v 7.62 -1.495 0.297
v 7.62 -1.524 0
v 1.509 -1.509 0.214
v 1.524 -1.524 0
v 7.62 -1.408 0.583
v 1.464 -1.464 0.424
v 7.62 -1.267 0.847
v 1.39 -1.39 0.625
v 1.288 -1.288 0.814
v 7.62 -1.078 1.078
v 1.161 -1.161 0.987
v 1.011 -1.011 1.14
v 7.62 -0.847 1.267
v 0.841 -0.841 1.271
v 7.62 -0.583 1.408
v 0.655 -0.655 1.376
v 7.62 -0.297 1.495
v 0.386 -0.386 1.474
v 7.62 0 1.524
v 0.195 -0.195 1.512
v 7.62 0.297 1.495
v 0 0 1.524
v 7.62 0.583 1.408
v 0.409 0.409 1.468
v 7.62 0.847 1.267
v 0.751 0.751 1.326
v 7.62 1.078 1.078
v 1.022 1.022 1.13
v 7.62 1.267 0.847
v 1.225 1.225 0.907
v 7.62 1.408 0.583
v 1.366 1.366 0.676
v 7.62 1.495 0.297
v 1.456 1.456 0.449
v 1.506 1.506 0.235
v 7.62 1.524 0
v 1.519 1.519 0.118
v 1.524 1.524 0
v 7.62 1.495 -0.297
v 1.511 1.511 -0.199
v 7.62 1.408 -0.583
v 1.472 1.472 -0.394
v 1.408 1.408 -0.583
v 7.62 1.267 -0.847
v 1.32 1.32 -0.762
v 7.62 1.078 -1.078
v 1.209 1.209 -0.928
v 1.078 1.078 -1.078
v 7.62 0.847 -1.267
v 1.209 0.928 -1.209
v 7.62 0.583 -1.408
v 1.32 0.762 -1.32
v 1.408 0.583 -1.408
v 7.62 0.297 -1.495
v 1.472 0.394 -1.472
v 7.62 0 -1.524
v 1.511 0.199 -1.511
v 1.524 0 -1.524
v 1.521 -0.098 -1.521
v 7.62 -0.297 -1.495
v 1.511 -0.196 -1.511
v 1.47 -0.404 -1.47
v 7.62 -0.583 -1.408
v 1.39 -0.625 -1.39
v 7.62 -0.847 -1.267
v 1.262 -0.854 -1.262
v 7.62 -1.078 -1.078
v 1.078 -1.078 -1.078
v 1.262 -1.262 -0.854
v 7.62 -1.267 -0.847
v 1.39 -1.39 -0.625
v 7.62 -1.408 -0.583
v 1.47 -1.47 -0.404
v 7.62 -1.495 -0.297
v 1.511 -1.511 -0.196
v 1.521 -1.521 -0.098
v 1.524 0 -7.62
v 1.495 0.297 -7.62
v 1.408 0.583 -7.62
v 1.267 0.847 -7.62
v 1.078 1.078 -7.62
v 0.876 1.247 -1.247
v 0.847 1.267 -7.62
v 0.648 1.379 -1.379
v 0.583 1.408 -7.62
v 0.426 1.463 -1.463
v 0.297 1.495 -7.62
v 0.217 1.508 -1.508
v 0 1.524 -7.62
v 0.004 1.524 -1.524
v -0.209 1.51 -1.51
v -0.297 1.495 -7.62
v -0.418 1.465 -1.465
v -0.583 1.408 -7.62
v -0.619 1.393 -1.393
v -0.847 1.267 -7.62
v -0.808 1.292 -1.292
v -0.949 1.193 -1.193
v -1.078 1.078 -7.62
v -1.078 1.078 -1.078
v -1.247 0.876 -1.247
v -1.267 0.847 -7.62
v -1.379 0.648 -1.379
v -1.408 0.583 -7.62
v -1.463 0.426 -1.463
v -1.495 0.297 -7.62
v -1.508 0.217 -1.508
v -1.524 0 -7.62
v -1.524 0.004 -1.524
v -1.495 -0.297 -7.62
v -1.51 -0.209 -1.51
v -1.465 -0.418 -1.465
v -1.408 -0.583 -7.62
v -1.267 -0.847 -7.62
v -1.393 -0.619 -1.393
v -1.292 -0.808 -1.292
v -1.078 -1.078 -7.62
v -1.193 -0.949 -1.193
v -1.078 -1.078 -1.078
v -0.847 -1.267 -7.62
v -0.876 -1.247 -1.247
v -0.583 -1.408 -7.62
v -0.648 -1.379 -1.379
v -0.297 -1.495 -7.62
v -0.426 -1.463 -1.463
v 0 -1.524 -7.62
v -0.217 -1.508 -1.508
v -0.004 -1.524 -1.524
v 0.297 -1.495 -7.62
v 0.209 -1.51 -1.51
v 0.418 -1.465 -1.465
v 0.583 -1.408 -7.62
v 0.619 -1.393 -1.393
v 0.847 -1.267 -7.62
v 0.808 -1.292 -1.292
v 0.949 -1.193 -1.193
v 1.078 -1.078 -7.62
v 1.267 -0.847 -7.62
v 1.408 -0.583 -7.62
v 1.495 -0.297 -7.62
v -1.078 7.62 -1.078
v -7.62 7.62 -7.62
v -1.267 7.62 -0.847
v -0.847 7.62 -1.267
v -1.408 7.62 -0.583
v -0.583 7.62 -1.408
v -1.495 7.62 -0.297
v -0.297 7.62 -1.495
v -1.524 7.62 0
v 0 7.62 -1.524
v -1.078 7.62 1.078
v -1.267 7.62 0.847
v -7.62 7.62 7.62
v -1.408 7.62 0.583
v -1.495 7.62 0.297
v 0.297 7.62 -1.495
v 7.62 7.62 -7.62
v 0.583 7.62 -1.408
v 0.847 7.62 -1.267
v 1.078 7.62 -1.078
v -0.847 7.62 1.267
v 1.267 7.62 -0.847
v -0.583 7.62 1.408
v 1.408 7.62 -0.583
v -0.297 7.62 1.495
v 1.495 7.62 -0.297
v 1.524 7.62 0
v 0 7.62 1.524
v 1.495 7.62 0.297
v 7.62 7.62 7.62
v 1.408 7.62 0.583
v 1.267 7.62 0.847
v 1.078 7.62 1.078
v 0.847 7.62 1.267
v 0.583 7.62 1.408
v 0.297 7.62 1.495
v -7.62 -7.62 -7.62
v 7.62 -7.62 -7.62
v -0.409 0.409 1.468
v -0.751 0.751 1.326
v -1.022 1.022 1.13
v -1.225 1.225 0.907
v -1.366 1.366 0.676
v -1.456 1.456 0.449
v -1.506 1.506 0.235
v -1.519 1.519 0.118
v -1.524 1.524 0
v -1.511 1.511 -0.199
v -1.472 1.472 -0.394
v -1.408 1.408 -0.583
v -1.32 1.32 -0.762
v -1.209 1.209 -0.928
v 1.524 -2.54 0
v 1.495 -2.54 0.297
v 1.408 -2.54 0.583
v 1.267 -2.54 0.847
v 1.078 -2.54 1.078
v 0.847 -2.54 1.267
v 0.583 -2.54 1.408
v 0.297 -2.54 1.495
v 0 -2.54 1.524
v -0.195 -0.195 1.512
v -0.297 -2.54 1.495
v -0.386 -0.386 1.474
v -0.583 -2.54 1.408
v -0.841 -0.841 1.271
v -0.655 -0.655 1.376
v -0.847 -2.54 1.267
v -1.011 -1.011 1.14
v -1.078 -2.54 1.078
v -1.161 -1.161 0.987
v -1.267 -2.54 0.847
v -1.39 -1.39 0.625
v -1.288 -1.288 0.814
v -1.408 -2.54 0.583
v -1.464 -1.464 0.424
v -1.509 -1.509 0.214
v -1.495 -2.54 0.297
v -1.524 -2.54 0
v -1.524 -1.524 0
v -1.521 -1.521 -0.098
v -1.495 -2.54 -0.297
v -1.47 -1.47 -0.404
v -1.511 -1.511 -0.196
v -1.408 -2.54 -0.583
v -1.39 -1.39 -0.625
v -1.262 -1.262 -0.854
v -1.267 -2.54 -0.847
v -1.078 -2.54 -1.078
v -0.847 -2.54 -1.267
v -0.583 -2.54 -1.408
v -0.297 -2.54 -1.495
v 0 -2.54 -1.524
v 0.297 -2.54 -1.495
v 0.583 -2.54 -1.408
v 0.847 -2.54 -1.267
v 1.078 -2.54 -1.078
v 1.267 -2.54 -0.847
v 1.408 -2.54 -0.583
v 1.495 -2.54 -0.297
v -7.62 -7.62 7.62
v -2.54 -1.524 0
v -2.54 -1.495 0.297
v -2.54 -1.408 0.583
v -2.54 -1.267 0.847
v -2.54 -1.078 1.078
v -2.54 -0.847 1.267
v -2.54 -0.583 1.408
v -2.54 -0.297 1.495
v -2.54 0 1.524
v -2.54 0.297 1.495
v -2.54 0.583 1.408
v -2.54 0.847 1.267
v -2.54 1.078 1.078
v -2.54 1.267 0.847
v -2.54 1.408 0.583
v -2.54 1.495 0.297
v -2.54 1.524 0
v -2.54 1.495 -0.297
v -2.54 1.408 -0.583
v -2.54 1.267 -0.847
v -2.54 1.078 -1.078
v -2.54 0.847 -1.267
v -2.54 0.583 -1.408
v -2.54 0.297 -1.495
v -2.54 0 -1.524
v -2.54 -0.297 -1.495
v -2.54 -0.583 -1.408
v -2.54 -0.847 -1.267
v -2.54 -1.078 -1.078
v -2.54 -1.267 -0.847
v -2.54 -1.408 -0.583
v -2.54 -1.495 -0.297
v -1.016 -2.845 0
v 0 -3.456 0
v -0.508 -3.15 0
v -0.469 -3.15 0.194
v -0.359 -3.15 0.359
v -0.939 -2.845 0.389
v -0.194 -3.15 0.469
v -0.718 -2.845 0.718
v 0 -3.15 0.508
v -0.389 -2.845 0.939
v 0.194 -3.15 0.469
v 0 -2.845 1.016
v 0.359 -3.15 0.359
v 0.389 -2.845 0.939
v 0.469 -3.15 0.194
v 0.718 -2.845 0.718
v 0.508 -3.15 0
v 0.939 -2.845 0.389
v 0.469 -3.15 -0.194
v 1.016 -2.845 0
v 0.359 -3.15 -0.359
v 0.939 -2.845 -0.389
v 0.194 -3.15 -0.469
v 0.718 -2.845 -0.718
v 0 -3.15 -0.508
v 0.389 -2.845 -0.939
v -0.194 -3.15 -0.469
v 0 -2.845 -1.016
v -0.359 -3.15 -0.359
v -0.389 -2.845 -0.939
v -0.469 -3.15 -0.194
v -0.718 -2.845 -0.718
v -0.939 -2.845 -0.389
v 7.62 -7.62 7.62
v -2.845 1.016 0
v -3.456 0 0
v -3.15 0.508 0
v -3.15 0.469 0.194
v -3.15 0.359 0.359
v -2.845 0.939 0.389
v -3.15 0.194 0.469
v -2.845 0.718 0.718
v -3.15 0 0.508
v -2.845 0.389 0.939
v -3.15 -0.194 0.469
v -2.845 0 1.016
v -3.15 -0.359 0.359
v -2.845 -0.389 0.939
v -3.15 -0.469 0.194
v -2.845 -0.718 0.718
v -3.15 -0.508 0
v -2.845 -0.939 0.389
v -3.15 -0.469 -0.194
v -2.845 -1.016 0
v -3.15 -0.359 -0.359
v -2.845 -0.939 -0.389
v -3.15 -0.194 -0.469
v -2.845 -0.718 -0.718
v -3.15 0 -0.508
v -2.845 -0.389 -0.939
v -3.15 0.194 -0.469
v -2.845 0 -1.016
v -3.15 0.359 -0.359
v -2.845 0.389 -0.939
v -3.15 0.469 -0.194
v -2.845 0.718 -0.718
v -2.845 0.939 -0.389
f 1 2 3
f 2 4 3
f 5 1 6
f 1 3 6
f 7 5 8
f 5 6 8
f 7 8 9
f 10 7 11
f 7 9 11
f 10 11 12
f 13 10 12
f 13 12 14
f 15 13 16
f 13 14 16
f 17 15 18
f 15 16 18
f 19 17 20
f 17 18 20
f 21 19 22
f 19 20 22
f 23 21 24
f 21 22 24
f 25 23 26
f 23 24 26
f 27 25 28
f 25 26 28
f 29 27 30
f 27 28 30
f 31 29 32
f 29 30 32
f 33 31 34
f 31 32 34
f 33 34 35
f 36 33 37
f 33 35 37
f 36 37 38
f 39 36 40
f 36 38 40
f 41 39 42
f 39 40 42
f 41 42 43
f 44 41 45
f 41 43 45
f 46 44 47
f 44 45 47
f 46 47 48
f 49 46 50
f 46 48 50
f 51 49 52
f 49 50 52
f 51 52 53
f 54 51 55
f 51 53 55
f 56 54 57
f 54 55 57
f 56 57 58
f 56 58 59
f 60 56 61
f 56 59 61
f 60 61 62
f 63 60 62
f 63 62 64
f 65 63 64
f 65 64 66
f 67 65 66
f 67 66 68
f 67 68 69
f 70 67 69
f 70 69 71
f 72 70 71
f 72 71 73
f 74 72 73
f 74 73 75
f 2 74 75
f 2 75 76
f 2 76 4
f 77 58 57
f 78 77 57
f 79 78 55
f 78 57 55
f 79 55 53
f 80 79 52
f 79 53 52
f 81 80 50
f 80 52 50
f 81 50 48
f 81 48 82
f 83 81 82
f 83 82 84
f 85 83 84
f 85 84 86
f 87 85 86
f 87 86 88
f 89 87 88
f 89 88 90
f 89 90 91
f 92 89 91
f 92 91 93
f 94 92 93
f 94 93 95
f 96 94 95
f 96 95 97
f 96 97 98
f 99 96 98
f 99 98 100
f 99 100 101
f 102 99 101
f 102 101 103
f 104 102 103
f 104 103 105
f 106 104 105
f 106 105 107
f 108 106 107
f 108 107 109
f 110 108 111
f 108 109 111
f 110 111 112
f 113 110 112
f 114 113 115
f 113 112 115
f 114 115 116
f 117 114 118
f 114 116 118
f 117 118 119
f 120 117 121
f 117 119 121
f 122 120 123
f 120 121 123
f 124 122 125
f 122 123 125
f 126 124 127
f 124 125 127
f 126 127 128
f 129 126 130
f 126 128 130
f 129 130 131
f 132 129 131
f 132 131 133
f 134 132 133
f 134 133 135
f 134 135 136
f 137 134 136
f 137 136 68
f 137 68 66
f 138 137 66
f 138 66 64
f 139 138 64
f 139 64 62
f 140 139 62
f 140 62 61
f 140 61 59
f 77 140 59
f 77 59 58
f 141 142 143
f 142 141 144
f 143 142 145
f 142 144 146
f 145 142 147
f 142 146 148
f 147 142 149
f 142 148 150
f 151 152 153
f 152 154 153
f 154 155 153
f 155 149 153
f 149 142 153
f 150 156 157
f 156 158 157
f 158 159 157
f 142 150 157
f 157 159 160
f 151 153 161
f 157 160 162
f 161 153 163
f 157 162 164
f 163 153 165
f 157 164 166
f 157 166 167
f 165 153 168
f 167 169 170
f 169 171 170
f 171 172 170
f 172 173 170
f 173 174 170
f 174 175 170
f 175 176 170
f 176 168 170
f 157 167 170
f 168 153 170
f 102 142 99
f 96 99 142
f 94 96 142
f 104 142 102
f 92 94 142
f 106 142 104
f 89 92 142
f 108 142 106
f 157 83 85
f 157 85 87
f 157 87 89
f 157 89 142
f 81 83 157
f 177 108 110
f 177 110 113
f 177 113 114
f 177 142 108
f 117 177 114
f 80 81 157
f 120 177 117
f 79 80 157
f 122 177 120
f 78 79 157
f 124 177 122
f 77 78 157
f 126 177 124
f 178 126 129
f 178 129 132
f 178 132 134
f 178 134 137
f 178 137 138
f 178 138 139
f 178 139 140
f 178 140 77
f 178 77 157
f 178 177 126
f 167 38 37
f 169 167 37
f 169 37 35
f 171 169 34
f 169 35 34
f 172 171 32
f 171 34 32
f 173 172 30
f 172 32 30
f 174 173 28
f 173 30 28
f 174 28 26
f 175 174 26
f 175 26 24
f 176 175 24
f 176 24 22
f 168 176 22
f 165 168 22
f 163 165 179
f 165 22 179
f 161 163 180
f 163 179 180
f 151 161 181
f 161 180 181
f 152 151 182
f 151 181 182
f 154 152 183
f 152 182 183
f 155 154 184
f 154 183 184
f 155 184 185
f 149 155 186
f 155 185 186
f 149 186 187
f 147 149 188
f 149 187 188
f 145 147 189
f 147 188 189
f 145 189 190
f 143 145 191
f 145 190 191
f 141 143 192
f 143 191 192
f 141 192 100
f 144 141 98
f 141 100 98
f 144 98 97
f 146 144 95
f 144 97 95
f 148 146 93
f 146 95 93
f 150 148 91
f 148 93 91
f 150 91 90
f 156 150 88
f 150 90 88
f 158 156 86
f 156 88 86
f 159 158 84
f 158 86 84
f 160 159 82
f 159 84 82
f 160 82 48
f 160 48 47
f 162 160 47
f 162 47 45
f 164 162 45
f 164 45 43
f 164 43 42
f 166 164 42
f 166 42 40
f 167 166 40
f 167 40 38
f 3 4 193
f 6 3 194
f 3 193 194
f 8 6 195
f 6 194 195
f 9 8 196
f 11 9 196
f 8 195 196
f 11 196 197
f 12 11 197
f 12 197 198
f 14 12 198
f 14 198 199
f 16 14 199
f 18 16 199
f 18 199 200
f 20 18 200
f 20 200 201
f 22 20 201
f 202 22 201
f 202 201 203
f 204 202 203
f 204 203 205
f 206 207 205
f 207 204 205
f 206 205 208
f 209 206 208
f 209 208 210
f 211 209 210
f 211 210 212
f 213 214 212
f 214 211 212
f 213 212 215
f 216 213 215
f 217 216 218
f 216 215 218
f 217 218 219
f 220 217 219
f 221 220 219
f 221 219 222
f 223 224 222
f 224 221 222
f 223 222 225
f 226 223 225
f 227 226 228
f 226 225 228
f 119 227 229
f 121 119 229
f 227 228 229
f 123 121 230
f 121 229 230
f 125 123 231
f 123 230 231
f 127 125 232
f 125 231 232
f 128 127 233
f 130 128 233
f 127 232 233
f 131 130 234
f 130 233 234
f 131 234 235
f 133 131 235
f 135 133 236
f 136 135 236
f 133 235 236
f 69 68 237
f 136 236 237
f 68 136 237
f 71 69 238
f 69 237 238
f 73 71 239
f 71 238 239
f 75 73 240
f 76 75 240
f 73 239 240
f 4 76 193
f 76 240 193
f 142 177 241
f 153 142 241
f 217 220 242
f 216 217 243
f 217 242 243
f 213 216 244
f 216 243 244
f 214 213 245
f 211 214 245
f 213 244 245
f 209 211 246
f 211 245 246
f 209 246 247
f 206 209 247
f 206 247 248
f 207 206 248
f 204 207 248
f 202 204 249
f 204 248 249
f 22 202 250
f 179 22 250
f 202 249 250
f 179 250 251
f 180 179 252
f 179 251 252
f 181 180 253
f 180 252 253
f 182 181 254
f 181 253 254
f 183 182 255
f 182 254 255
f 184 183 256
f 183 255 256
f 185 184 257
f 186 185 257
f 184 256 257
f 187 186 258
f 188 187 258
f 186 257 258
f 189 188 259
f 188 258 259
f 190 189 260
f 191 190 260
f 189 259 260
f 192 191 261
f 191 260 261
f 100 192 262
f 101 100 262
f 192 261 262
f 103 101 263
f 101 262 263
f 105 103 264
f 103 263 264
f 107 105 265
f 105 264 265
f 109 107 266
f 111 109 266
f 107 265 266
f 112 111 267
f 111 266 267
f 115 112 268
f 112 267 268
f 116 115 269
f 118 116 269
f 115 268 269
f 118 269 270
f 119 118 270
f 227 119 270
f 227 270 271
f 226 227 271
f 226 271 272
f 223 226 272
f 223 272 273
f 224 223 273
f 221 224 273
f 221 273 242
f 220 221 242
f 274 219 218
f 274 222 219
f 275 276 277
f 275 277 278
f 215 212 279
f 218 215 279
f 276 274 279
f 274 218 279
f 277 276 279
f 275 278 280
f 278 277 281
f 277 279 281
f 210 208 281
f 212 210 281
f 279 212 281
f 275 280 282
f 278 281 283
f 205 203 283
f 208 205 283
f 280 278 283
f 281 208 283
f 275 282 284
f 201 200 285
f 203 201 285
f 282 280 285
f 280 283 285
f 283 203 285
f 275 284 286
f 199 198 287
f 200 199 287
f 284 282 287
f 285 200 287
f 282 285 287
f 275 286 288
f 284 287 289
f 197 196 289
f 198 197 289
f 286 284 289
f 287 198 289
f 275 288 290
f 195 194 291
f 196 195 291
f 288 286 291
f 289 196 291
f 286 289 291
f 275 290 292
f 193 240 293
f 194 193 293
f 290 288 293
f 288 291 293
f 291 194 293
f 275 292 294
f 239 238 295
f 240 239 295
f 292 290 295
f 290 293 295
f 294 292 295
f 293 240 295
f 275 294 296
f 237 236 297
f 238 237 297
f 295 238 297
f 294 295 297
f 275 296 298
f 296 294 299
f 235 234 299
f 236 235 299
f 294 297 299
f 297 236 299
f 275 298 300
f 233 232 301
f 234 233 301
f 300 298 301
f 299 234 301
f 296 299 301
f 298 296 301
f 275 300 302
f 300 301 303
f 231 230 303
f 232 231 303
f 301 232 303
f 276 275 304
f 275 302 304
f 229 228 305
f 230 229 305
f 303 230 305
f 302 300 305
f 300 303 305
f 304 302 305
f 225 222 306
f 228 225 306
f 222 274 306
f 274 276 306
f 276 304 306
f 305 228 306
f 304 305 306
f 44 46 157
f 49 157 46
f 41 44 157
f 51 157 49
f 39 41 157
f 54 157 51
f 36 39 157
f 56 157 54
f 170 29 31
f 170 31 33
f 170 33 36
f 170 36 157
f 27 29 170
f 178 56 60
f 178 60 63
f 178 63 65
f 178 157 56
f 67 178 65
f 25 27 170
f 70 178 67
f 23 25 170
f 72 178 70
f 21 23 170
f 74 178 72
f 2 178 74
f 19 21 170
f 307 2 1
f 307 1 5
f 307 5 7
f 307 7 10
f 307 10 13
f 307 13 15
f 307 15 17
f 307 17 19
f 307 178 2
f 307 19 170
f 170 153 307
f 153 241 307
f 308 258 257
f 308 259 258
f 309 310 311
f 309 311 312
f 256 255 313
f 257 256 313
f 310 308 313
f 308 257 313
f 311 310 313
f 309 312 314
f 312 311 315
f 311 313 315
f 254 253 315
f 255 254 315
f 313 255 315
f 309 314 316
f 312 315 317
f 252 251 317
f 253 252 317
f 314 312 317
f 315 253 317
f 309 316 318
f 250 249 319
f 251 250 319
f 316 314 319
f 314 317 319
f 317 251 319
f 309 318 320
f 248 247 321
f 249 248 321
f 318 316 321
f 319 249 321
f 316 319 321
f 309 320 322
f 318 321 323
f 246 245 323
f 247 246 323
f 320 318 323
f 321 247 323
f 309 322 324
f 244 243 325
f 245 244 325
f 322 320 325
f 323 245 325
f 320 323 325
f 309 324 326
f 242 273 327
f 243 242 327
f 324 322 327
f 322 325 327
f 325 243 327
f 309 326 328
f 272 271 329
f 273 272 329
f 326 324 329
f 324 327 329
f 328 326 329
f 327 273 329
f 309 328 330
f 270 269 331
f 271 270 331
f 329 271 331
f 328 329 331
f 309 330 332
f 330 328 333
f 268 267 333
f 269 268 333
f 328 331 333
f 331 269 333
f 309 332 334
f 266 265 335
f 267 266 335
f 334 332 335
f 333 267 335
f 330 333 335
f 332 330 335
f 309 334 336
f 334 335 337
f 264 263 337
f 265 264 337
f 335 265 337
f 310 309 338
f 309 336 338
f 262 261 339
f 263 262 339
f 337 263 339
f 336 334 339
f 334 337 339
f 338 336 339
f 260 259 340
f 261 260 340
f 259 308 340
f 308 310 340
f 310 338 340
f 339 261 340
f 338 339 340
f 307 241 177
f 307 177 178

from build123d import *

# Parameters (mm, degrees)
F0_W     = 15.24
F0_H     = 15.24
F1_DEPTH = 7.62
F3_D     = 3.048
F3_DEPTH = 10.16
F3_TIP   = 0.9157115834
F5_D     = 3.048
F5_DEPTH = 10.16
F5_TIP   = 0.9157115834
F7_D     = 3.048
F7_DEPTH = 10.16
F7_TIP   = 0.9157115834


with BuildPart() as f1:
    # F0 (on Front) → F1 (new body, symmetric)
    with BuildSketch(Plane.XZ):
        Rectangle(F0_W, F0_H)
    extrude(amount=F1_DEPTH, both=True)

    # F3 (one way)
    with BuildSketch(Plane.XY):
        with Locations((0, 0)):
            Circle(F3_D / 2)
    extrude(amount=-F3_DEPTH, mode=Mode.SUBTRACT)
    with Locations(Plane.XY):
        with Locations((0, 0)):
            with Locations((0, 0, -(F3_DEPTH + F3_TIP / 2))):  # 118° drill point
                Cone(0, F3_D / 2, F3_TIP, mode=Mode.SUBTRACT)

    # F5
    with Locations(Plane.YZ.offset(7.62)):
        with Locations((0, 0)):
            Hole(F5_D / 2, depth=F5_DEPTH)
            with Locations((0, 0, -(F5_DEPTH + F5_TIP / 2))):  # 118° drill point
                Cone(0, F5_D / 2, F5_TIP, mode=Mode.SUBTRACT)

    # F7
    with Locations(Plane(origin=(0, 7.62, 0), x_dir=(-1, 0, 0), z_dir=(0, 1, 0))):
        with Locations((0, 0)):
            Hole(F7_D / 2, depth=F7_DEPTH)
            with Locations((0, 0, -(F7_DEPTH + F7_TIP / 2))):  # 118° drill point
                Cone(0, F7_D / 2, F7_TIP, mode=Mode.SUBTRACT)


solid = f1.part
